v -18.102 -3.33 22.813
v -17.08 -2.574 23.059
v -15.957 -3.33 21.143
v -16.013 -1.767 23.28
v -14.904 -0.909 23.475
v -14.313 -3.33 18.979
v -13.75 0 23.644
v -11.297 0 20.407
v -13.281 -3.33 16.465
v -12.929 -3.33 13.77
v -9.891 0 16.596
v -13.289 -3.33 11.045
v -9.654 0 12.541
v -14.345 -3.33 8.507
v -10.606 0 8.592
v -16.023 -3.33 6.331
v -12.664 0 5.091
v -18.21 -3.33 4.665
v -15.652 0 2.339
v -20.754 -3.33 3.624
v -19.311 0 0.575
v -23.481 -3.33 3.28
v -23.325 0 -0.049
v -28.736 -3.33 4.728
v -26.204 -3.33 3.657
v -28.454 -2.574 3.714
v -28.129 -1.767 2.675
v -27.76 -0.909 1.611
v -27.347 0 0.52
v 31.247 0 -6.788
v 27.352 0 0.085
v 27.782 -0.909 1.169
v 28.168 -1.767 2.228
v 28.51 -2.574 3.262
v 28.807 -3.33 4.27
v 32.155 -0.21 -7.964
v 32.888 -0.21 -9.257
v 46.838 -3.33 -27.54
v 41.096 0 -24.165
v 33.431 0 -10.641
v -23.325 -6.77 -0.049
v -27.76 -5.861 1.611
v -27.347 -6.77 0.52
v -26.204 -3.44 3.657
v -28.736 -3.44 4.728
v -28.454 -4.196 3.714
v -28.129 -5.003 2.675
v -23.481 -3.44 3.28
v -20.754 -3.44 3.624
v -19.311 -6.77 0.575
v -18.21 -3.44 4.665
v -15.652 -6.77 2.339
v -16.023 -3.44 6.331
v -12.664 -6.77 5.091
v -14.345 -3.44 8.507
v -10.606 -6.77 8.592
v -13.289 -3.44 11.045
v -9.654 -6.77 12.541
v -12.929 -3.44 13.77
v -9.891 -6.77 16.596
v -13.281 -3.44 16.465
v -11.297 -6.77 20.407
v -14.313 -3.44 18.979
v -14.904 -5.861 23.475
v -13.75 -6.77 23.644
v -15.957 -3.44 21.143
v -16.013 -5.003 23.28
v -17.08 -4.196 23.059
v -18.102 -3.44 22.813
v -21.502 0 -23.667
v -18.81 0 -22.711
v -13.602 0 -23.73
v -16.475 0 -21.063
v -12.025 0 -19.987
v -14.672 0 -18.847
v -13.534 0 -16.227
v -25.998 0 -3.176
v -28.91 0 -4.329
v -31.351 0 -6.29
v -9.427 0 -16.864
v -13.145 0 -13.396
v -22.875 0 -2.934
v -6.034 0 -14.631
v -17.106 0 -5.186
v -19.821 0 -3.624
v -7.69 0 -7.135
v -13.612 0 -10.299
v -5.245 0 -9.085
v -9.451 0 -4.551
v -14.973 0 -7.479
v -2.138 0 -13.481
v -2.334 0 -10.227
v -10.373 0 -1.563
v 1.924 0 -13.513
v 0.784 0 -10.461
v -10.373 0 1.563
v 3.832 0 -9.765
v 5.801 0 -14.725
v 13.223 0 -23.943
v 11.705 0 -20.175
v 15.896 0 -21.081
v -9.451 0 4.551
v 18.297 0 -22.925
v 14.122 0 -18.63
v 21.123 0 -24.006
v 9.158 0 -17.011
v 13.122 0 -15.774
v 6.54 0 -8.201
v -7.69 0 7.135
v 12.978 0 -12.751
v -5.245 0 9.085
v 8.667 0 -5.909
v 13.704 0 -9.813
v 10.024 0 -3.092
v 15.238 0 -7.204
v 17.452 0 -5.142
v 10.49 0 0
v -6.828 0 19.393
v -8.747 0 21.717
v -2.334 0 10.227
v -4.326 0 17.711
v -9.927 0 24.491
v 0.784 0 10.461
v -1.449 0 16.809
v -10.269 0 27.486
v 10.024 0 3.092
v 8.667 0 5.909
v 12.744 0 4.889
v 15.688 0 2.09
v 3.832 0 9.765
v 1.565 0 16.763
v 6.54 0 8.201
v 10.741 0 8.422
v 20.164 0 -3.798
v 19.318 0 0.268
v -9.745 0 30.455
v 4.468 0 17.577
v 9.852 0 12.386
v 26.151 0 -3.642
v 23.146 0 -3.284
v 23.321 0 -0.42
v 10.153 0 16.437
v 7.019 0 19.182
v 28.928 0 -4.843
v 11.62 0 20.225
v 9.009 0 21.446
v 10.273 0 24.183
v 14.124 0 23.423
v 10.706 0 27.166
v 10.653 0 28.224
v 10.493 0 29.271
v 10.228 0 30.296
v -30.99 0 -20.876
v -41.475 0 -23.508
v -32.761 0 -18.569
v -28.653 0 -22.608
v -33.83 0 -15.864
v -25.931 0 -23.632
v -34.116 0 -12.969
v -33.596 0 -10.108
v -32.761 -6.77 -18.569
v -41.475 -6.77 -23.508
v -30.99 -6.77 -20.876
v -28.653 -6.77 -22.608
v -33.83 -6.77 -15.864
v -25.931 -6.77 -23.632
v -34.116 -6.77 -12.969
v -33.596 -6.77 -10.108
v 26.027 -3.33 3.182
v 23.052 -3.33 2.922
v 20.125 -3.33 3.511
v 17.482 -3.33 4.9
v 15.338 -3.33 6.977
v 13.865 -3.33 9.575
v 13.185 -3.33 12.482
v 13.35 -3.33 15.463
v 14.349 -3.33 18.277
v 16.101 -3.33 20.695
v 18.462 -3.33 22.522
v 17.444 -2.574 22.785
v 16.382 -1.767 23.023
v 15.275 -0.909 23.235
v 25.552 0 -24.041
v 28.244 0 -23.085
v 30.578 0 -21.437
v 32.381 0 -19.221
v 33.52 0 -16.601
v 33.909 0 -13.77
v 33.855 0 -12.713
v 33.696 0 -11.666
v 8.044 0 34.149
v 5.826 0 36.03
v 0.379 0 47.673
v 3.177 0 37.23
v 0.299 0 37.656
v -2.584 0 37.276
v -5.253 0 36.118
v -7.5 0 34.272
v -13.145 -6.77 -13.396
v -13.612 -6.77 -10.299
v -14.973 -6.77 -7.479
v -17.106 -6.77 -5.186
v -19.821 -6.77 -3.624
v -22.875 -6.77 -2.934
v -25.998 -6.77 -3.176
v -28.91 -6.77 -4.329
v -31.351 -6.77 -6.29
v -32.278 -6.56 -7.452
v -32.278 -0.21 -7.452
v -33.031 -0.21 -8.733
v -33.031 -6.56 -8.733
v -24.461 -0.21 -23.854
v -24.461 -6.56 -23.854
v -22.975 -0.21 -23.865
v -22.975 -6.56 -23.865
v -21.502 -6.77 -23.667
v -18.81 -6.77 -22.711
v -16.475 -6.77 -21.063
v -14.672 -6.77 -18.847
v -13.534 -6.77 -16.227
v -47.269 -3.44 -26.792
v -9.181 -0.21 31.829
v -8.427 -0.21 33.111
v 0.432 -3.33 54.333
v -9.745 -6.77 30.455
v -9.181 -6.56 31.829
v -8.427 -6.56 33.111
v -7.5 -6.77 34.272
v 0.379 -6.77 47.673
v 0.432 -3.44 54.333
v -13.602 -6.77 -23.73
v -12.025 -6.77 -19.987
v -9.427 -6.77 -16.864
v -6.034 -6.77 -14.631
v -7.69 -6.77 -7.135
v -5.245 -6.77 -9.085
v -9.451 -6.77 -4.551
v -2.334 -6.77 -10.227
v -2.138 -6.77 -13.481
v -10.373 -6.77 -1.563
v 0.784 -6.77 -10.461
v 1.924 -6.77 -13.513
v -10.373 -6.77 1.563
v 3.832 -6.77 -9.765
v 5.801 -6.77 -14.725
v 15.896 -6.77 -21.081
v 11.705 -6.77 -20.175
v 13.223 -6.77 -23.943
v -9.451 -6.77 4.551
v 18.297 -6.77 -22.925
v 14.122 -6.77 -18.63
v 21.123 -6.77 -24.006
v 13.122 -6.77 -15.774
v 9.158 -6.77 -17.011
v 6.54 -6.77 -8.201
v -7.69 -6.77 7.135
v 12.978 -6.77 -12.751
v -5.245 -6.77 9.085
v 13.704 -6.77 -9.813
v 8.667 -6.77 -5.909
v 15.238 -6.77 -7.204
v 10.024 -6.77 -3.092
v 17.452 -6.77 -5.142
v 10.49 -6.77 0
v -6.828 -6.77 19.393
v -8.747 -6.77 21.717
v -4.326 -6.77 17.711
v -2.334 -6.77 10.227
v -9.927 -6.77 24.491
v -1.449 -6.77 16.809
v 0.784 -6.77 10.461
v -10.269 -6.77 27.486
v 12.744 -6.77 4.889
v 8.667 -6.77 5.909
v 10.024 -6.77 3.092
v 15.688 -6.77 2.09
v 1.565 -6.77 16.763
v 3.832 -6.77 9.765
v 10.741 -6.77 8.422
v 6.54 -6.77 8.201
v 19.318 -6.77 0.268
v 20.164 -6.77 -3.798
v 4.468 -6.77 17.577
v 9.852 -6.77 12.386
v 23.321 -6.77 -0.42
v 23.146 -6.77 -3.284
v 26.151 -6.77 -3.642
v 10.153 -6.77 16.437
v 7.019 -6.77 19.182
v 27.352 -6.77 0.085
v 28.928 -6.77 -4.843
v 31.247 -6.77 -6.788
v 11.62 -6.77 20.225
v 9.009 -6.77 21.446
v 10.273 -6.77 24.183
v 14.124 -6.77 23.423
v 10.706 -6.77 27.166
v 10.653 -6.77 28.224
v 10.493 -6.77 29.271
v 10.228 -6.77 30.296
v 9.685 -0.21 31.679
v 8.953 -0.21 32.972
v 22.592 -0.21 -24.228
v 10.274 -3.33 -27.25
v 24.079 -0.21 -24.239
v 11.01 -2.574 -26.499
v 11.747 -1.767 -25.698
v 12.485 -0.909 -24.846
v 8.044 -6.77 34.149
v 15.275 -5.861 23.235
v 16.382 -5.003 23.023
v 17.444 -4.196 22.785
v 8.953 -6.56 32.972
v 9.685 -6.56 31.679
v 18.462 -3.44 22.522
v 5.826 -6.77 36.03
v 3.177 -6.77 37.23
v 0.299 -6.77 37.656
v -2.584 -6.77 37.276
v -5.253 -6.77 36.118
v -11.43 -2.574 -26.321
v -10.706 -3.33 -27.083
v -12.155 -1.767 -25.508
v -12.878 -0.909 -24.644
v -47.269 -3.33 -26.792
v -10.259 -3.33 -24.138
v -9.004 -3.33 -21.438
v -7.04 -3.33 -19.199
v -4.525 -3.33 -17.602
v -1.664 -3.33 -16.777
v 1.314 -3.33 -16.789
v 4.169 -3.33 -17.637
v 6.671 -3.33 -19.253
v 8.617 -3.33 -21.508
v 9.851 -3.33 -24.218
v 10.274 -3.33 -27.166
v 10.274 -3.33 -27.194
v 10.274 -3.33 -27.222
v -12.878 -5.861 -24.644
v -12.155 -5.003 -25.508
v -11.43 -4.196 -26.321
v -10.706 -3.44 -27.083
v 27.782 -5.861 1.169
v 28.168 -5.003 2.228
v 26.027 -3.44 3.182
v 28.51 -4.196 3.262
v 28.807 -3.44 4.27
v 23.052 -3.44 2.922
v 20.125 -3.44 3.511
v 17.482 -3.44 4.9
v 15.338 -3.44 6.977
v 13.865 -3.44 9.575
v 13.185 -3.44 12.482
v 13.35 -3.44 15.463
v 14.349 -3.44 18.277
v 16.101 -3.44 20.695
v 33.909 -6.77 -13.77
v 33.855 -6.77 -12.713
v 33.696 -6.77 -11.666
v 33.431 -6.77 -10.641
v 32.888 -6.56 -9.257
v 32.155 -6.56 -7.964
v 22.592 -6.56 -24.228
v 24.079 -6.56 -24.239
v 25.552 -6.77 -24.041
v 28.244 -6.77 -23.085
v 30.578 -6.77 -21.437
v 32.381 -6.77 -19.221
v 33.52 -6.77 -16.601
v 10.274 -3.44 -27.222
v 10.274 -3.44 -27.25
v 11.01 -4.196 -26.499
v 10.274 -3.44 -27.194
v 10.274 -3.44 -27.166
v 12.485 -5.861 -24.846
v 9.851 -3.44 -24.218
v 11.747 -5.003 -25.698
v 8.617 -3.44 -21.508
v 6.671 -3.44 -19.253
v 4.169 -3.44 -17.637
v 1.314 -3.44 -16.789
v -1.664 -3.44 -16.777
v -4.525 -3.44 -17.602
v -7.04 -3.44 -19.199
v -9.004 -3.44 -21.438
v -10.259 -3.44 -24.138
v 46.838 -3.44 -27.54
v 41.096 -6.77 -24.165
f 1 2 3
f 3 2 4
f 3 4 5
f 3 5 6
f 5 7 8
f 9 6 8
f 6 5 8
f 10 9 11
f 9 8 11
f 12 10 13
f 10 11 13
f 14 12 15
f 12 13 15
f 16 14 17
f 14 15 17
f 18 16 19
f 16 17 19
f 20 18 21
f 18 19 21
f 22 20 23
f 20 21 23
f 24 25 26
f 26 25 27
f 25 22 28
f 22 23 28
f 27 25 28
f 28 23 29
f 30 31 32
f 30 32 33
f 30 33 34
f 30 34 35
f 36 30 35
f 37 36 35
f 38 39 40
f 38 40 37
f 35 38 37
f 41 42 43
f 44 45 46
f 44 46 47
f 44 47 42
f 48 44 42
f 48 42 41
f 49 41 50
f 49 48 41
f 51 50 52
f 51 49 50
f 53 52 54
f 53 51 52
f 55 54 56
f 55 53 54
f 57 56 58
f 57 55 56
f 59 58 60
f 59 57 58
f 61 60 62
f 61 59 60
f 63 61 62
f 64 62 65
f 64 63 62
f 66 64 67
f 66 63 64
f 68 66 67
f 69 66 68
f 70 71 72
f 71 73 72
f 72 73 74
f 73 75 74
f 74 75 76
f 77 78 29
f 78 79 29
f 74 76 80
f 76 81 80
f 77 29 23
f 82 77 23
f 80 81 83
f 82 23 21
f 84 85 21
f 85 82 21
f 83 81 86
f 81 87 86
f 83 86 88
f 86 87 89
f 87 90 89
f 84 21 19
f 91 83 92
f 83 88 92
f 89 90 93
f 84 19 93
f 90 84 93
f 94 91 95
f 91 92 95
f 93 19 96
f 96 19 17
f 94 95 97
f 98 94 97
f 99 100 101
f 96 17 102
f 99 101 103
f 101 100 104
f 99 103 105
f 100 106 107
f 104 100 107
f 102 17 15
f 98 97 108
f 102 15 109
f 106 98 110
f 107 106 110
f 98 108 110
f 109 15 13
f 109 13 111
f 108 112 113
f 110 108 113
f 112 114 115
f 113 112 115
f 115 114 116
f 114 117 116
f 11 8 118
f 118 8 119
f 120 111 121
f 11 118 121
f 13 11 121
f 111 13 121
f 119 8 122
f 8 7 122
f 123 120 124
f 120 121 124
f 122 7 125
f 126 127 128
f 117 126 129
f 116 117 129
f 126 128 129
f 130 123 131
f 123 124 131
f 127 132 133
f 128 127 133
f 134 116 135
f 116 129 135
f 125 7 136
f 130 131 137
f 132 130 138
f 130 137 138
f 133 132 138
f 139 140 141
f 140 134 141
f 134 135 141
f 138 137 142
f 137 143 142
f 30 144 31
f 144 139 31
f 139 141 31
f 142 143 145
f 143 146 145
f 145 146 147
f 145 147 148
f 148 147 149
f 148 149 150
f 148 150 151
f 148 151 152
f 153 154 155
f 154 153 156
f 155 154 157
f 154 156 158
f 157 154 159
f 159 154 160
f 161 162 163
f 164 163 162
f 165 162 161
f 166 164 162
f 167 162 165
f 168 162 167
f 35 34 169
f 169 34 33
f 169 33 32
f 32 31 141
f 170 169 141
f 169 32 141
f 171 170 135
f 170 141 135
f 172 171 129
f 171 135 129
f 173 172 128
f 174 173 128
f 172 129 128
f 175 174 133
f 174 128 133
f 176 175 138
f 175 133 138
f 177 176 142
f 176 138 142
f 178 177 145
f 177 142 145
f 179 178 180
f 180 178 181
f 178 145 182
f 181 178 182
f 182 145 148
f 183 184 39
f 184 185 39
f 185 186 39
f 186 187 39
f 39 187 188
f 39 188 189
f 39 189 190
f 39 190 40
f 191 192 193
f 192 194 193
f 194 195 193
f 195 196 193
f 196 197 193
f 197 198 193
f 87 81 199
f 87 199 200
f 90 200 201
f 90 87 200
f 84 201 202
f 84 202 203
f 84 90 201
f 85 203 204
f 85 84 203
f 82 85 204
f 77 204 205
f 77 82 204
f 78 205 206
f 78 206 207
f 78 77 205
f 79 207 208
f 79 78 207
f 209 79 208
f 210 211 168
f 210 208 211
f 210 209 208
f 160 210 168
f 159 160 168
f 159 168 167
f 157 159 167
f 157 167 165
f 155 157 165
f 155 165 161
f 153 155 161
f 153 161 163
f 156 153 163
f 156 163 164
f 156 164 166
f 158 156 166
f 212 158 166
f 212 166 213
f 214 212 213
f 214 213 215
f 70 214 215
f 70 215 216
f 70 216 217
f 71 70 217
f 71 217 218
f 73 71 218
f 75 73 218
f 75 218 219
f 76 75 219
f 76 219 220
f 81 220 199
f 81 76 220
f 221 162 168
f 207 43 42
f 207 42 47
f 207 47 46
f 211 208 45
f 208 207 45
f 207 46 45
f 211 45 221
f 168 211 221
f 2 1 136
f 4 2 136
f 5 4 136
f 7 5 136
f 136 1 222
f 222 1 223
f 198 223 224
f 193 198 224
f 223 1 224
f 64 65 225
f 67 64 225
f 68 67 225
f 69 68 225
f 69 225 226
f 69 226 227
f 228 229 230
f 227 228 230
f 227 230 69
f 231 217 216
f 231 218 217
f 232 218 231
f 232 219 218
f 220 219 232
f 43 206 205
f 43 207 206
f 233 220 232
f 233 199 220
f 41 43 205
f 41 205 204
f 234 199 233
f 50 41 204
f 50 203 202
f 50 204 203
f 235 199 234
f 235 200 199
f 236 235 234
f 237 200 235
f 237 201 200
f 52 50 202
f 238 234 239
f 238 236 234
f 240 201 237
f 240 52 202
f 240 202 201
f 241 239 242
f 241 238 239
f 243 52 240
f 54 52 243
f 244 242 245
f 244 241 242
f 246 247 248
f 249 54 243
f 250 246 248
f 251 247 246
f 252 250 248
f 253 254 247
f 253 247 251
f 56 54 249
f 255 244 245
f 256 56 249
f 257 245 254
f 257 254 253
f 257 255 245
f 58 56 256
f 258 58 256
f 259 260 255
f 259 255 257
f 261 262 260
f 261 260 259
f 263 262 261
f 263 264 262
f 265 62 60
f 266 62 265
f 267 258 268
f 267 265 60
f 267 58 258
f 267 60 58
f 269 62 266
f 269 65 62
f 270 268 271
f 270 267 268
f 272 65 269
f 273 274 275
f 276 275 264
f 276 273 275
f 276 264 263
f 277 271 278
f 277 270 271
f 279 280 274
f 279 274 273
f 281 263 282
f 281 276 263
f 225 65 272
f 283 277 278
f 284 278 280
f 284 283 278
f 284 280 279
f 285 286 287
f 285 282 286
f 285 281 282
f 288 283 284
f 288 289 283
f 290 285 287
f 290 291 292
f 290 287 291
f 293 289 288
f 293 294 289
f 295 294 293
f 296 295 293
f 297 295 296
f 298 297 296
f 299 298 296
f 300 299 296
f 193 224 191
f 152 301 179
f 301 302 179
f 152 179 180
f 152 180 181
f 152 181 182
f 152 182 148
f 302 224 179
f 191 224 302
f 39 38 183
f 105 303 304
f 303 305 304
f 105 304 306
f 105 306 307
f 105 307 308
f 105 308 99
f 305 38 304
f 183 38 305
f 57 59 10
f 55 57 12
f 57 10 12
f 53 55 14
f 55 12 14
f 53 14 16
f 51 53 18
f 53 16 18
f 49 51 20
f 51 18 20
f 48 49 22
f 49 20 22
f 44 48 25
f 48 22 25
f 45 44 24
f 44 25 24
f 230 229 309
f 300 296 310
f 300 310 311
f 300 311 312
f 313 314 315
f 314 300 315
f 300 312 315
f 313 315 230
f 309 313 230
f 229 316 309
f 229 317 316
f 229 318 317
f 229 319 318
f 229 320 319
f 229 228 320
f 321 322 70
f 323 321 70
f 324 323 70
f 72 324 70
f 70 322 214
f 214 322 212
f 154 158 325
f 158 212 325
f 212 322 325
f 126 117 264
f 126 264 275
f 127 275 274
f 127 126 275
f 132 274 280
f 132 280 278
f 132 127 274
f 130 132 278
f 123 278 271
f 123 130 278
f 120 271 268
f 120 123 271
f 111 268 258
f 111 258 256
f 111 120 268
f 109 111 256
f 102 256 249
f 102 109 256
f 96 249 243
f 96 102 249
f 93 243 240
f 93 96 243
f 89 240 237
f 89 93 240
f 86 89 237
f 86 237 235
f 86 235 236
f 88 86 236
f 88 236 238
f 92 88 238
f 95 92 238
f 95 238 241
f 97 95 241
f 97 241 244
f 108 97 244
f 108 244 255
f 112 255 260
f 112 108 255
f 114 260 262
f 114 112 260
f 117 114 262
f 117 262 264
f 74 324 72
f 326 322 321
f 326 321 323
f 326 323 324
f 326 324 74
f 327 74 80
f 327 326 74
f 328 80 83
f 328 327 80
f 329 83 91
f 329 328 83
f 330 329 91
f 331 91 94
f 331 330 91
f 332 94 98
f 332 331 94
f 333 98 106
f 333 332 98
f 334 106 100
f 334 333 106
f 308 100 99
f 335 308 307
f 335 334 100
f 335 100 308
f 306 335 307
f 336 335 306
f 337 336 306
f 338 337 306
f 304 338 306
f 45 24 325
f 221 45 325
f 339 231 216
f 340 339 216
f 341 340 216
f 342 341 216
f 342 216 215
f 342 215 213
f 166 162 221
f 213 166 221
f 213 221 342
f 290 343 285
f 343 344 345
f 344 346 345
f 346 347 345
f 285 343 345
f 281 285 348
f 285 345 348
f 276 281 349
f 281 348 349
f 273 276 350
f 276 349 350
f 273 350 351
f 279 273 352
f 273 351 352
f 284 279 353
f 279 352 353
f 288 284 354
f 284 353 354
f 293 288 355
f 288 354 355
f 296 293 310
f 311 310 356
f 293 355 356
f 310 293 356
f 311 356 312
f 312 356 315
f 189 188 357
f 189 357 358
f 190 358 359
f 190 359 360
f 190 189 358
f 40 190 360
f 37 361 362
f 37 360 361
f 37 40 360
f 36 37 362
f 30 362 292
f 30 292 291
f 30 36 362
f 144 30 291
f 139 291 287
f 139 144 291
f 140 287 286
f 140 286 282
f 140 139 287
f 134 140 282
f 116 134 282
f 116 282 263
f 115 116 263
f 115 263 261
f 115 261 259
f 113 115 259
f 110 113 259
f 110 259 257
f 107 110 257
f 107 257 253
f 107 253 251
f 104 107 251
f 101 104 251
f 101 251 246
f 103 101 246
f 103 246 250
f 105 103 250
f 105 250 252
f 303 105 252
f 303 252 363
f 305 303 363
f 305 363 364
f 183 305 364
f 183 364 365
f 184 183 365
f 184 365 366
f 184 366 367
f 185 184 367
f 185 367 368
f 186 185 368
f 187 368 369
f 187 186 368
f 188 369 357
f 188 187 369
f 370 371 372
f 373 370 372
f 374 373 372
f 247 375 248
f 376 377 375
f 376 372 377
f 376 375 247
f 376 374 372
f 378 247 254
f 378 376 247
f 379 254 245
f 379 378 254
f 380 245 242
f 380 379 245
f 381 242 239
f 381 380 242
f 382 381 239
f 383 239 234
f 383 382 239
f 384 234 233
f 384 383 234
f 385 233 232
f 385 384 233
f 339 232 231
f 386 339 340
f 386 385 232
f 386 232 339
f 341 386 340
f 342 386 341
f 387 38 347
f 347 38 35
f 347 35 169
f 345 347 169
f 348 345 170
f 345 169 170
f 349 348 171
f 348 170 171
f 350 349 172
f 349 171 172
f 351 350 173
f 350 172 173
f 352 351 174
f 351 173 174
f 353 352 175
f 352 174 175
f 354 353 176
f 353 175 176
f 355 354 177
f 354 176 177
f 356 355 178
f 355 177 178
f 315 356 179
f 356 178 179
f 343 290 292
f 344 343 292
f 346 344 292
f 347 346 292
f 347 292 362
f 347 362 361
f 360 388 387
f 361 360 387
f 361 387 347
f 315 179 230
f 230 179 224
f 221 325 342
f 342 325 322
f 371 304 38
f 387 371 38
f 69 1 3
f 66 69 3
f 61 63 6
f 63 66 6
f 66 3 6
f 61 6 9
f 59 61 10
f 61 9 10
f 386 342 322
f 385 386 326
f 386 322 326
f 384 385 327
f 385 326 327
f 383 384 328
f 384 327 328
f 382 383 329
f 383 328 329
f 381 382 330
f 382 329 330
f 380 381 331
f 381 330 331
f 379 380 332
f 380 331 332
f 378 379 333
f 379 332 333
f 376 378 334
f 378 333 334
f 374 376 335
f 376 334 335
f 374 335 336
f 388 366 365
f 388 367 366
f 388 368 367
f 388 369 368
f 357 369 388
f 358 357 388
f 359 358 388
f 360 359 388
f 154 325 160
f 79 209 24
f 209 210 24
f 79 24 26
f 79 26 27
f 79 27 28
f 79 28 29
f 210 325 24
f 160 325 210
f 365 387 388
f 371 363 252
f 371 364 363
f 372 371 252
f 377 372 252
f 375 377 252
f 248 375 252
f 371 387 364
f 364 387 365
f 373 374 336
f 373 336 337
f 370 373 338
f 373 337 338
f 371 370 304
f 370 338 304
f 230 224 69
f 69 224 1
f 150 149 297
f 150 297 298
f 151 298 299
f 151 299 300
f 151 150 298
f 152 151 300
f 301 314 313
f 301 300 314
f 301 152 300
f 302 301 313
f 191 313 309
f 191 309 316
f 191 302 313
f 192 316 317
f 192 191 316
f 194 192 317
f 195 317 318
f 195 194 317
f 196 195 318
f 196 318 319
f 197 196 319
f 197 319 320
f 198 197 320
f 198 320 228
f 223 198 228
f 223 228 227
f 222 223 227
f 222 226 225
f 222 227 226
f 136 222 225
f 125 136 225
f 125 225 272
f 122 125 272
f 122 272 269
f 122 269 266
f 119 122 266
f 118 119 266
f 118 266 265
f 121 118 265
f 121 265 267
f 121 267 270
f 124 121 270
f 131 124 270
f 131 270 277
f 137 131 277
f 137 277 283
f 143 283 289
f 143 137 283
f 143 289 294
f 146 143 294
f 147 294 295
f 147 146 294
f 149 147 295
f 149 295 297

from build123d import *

# Parameters (mm, degrees)
F0_R         = 10.49
F1_DEPTH     = 6.77
F2_T1_DEPTH  = 53.6924086999
F2_T3_DEPTH  = 53.6924086999
F2_T5_DEPTH  = 53.6924086999
F2_T7_DEPTH  = 53.6924086999
F2_T9_DEPTH  = 53.6924086999
F2_T11_DEPTH = 53.6924086999
F2_T14_ANGLE = 273.6993702429
F2_T16_ANGLE = 273.6993702429
F2_T18_ANGLE = 273.6993702439
F2_T20_ANGLE = 273.6993702429
F2_T22_ANGLE = 273.6993702429
F2_T24_ANGLE = 273.6993702429


# Not quite as in the source:
# - a fillet or chamfer that OpenCascade refuses, or shapes differently, is made with other operations: its cross-section is extruded or revolved along the edge and cut away or added


with BuildPart() as f1:
    # F0 (on Front) → F1 (new body)
    with BuildSketch(Plane.XZ):
        with BuildLine():
            Line((18.4621305086, 22.5221560266), (0.4319489998, 54.3327168478))
            Line((0.4319489998, 54.3327168478), (-18.1017140256, 22.8128412157))
            ThreePointArc((-18.1017140256, 22.8128412157), (-14.313385988, 18.9790663983), (-12.9287692735, 13.7702186154))
            ThreePointArc((-12.9287692735, 13.7702186154), (-18.2099214906, 4.66483533), (-28.7358245213, 4.7275960151))
            Line((-28.7358245213, 4.7275960151), (-47.2694875467, -26.792279617))
            Line((-47.2694875467, -26.792279617), (-10.7056430125, -27.0829648061))
            ThreePointArc((-10.7056430125, -27.0829648061), (-0.1742773616, -16.6764412961), (10.2740255001, -27.1663584239))
            ThreePointArc((10.2740255001, -27.1663584239), (10.2739426279, -27.2080555622), (10.2736940127, -27.2497520417))
            Line((10.2736940127, -27.2497520417), (46.8375385469, -27.5404372308))
            Line((46.8375385469, -27.5404372308), (28.8073570381, 4.2701235904))
            ThreePointArc((28.8073570381, 4.2701235904), (14.5087275553, 8.2235265437), (18.4621305086, 22.5221560266))
        make_face()
        with Locations((-23.6347437733, -13.3961398085)):
            Circle(F0_R, mode=Mode.SUBTRACT)
        Circle(F0_R, mode=Mode.SUBTRACT)
        with Locations((23.4187692735, -13.7702186154)):
            Circle(F0_R, mode=Mode.SUBTRACT)
        with Locations((0.2159744999, 27.1663584239)):
            Circle(F0_R, mode=Mode.SUBTRACT)
    extrude(amount=F1_DEPTH)

    # F2: chamfer of 3.33 on 18 edges, made by hand

    # F2_s2 → F2_t1 (cut)
    with BuildSketch(Plane(origin=(-0.9763794466, 0, -1.6605113995), x_dir=(0, 1, 0), z_dir=(-0.5068689464, 0, -0.8620231268))):
        Polygon((-6.77, -23.8372169167), (-3.44, -27.1672169167), (-6.77, -27.1672169167), align=None)
        Polygon((-3.33, -27.1672169167), (0, -23.8372169167), (0, -27.1672169167), align=None)
    extrude(amount=F2_T1_DEPTH, mode=Mode.SUBTRACT)

    # F2_s4 → F2_t3 (cut)
    with BuildSketch(Plane(origin=(28.1913940744, 0, 47.9446094332), x_dir=(0, 1, 0), z_dir=(-0.5068689464, 0, -0.8620231268))):
        Polygon((-6.77, -23.8372169167), (-3.44, -27.1672169167), (-6.77, -27.1672169167), align=None)
        Polygon((-3.33, -27.1672169167), (0, -23.8372169167), (0, -27.1672169167), align=None)
    extrude(amount=F2_T3_DEPTH, mode=Mode.SUBTRACT)

    # F2_s6 → F2_t5 (cut)
    with BuildSketch(Plane(origin=(-0.9498553319, 0, 1.6758251042), x_dir=(0, 1, 0), z_dir=(-0.4930994533, 0, 0.8699729474))):
        Polygon((-6.77, -23.8372169167), (-3.44, -27.1672169167), (-6.77, -27.1672169167), align=None)
        Polygon((-3.33, -27.1672169167), (0, -23.8372169167), (0, -27.1672169167), align=None)
    extrude(amount=F2_T5_DEPTH, mode=Mode.SUBTRACT)

    # F2_s8 → F2_t7 (cut)
    with BuildSketch(Plane(origin=(-55.6169467809, 0, 0.4421587199), x_dir=(0, 1, 0), z_dir=(0.9999683997, 0, -0.0079498206))):
        Polygon((-6.77, -23.8372169167), (-3.44, -27.1672169167), (-6.77, -27.1672169167), align=None)
        Polygon((-3.33, -27.1672169167), (0, -23.8372169167), (0, -27.1672169167), align=None)
    extrude(amount=F2_T7_DEPTH, mode=Mode.SUBTRACT)

    # F2_s10 → F2_t9 (cut)
    with BuildSketch(Plane(origin=(1.9262347785, 0, -0.0153137048), x_dir=(0, 1, 0), z_dir=(0.9999683997, 0, -0.0079498206))):
        Polygon((-3.44, -27.1672169167), (-6.77, -23.8372169167), (-6.77, -27.1672169167), align=None)
        Polygon((-3.33, -27.1672169167), (0, -23.8372169167), (0, -27.1672169167), align=None)
    extrude(amount=F2_T9_DEPTH, mode=Mode.SUBTRACT)

    # F2_s12 → F2_t11 (cut)
    with BuildSketch(Plane(origin=(27.4255527065, 0, -48.3867681532), x_dir=(0, 1, 0), z_dir=(-0.4930994533, 0, 0.8699729474))):
        Polygon((-6.77, -23.8372169167), (-3.44, -27.1672169167), (-6.77, -27.1672169167), align=None)
        Polygon((0, -23.8372169167), (-3.33, -27.1672169167), (0, -27.1672169167), align=None)
    extrude(amount=F2_T11_DEPTH, mode=Mode.SUBTRACT)

    # F2_s13 → F2_t14 (revolve, cut)
    with BuildSketch(Plane(origin=(-4.0831164566, 0, 18.1258589444), x_dir=(0, 1, 0), z_dir=(-0.2197579888, 0, 0.97555442))):
        Polygon((-6.77, 33.6401683275), (-3.44, 30.3101683275), (-6.77, 30.3101683275), align=None)
    revolve(axis=Axis((-23.4187692735, -6.77, 13.7702186154), (0, -1, 0)), revolution_arc=F2_T14_ANGLE, mode=Mode.SUBTRACT)

    # F2_s15 → F2_t16 (revolve, cut)
    with BuildSketch(Plane(origin=(4.3707858991, 0, 18.0586498137), x_dir=(0, 1, 0), z_dir=(0.2352406866, 0, 0.9719371479))):
        Polygon((-6.77, -33.6401683275), (-3.44, -30.3101683275), (-6.77, -30.3101683275), align=None)
    revolve(axis=Axis((23.6347437733, -6.77, 13.3961398085), (0, 1, 0)), revolution_arc=F2_T16_ANGLE, mode=Mode.SUBTRACT)

    # F2_s17 → F2_t18 (revolve, cut)
    with BuildSketch(Plane(origin=(-13.6558960829, 0, -12.59901205), x_dir=(0, 1, 0), z_dir=(-0.7349759161, 0, -0.678093211))):
        Polygon((-6.77, 33.6401683276), (-3.44, 30.3101683277), (-6.77, 30.3101683276), align=None)
    revolve(axis=Axis((-0.2159744998, -6.77, -27.1663584239), (0, -1, 0)), revolution_arc=F2_T18_ANGLE, mode=Mode.SUBTRACT)

    # F2_s19 → F2_t20 (revolve, cut)
    with BuildSketch(Plane(origin=(-17.8246424463, 0, -5.2441132837), x_dir=(0, 1, 0), z_dir=(-0.9593426042, 0, -0.2822441634))):
        Polygon((-3.33, -30.3101683275), (0, -33.6401683275), (0, -30.3101683275), align=None)
    revolve(axis=Axis((-23.4187692735, 0, 13.7702186154), (0, 1, 0)), revolution_arc=F2_T20_ANGLE, mode=Mode.SUBTRACT)

    # F2_s21 → F2_t22 (revolve, cut)
    with BuildSketch(Plane(origin=(13.4538565472, 0, -12.81453653), x_dir=(0, 1, 0), z_dir=(0.7241019176, 0, -0.6896929845))):
        Polygon((0, -33.6401683275), (-3.33, -30.3101683275), (0, -30.3101683275), align=None)
    revolve(axis=Axis((-0.2159744999, 0, -27.1663584239), (0, 1, 0)), revolution_arc=F2_T22_ANGLE, mode=Mode.SUBTRACT)

    # F2_s23 → F2_t24 (revolve, cut)
    with BuildSketch(Plane(origin=(4.3707858991, 0, 18.0586498137), x_dir=(0, 1, 0), z_dir=(0.2352406866, 0, 0.9719371479))):
        Polygon((-3.33, -30.3101683275), (0, -33.6401683275), (0, -30.3101683275), align=None)
    revolve(axis=Axis((23.6347437733, 0, 13.3961398085), (0, 1, 0)), revolution_arc=F2_T24_ANGLE, mode=Mode.SUBTRACT)


solid = f1.part
